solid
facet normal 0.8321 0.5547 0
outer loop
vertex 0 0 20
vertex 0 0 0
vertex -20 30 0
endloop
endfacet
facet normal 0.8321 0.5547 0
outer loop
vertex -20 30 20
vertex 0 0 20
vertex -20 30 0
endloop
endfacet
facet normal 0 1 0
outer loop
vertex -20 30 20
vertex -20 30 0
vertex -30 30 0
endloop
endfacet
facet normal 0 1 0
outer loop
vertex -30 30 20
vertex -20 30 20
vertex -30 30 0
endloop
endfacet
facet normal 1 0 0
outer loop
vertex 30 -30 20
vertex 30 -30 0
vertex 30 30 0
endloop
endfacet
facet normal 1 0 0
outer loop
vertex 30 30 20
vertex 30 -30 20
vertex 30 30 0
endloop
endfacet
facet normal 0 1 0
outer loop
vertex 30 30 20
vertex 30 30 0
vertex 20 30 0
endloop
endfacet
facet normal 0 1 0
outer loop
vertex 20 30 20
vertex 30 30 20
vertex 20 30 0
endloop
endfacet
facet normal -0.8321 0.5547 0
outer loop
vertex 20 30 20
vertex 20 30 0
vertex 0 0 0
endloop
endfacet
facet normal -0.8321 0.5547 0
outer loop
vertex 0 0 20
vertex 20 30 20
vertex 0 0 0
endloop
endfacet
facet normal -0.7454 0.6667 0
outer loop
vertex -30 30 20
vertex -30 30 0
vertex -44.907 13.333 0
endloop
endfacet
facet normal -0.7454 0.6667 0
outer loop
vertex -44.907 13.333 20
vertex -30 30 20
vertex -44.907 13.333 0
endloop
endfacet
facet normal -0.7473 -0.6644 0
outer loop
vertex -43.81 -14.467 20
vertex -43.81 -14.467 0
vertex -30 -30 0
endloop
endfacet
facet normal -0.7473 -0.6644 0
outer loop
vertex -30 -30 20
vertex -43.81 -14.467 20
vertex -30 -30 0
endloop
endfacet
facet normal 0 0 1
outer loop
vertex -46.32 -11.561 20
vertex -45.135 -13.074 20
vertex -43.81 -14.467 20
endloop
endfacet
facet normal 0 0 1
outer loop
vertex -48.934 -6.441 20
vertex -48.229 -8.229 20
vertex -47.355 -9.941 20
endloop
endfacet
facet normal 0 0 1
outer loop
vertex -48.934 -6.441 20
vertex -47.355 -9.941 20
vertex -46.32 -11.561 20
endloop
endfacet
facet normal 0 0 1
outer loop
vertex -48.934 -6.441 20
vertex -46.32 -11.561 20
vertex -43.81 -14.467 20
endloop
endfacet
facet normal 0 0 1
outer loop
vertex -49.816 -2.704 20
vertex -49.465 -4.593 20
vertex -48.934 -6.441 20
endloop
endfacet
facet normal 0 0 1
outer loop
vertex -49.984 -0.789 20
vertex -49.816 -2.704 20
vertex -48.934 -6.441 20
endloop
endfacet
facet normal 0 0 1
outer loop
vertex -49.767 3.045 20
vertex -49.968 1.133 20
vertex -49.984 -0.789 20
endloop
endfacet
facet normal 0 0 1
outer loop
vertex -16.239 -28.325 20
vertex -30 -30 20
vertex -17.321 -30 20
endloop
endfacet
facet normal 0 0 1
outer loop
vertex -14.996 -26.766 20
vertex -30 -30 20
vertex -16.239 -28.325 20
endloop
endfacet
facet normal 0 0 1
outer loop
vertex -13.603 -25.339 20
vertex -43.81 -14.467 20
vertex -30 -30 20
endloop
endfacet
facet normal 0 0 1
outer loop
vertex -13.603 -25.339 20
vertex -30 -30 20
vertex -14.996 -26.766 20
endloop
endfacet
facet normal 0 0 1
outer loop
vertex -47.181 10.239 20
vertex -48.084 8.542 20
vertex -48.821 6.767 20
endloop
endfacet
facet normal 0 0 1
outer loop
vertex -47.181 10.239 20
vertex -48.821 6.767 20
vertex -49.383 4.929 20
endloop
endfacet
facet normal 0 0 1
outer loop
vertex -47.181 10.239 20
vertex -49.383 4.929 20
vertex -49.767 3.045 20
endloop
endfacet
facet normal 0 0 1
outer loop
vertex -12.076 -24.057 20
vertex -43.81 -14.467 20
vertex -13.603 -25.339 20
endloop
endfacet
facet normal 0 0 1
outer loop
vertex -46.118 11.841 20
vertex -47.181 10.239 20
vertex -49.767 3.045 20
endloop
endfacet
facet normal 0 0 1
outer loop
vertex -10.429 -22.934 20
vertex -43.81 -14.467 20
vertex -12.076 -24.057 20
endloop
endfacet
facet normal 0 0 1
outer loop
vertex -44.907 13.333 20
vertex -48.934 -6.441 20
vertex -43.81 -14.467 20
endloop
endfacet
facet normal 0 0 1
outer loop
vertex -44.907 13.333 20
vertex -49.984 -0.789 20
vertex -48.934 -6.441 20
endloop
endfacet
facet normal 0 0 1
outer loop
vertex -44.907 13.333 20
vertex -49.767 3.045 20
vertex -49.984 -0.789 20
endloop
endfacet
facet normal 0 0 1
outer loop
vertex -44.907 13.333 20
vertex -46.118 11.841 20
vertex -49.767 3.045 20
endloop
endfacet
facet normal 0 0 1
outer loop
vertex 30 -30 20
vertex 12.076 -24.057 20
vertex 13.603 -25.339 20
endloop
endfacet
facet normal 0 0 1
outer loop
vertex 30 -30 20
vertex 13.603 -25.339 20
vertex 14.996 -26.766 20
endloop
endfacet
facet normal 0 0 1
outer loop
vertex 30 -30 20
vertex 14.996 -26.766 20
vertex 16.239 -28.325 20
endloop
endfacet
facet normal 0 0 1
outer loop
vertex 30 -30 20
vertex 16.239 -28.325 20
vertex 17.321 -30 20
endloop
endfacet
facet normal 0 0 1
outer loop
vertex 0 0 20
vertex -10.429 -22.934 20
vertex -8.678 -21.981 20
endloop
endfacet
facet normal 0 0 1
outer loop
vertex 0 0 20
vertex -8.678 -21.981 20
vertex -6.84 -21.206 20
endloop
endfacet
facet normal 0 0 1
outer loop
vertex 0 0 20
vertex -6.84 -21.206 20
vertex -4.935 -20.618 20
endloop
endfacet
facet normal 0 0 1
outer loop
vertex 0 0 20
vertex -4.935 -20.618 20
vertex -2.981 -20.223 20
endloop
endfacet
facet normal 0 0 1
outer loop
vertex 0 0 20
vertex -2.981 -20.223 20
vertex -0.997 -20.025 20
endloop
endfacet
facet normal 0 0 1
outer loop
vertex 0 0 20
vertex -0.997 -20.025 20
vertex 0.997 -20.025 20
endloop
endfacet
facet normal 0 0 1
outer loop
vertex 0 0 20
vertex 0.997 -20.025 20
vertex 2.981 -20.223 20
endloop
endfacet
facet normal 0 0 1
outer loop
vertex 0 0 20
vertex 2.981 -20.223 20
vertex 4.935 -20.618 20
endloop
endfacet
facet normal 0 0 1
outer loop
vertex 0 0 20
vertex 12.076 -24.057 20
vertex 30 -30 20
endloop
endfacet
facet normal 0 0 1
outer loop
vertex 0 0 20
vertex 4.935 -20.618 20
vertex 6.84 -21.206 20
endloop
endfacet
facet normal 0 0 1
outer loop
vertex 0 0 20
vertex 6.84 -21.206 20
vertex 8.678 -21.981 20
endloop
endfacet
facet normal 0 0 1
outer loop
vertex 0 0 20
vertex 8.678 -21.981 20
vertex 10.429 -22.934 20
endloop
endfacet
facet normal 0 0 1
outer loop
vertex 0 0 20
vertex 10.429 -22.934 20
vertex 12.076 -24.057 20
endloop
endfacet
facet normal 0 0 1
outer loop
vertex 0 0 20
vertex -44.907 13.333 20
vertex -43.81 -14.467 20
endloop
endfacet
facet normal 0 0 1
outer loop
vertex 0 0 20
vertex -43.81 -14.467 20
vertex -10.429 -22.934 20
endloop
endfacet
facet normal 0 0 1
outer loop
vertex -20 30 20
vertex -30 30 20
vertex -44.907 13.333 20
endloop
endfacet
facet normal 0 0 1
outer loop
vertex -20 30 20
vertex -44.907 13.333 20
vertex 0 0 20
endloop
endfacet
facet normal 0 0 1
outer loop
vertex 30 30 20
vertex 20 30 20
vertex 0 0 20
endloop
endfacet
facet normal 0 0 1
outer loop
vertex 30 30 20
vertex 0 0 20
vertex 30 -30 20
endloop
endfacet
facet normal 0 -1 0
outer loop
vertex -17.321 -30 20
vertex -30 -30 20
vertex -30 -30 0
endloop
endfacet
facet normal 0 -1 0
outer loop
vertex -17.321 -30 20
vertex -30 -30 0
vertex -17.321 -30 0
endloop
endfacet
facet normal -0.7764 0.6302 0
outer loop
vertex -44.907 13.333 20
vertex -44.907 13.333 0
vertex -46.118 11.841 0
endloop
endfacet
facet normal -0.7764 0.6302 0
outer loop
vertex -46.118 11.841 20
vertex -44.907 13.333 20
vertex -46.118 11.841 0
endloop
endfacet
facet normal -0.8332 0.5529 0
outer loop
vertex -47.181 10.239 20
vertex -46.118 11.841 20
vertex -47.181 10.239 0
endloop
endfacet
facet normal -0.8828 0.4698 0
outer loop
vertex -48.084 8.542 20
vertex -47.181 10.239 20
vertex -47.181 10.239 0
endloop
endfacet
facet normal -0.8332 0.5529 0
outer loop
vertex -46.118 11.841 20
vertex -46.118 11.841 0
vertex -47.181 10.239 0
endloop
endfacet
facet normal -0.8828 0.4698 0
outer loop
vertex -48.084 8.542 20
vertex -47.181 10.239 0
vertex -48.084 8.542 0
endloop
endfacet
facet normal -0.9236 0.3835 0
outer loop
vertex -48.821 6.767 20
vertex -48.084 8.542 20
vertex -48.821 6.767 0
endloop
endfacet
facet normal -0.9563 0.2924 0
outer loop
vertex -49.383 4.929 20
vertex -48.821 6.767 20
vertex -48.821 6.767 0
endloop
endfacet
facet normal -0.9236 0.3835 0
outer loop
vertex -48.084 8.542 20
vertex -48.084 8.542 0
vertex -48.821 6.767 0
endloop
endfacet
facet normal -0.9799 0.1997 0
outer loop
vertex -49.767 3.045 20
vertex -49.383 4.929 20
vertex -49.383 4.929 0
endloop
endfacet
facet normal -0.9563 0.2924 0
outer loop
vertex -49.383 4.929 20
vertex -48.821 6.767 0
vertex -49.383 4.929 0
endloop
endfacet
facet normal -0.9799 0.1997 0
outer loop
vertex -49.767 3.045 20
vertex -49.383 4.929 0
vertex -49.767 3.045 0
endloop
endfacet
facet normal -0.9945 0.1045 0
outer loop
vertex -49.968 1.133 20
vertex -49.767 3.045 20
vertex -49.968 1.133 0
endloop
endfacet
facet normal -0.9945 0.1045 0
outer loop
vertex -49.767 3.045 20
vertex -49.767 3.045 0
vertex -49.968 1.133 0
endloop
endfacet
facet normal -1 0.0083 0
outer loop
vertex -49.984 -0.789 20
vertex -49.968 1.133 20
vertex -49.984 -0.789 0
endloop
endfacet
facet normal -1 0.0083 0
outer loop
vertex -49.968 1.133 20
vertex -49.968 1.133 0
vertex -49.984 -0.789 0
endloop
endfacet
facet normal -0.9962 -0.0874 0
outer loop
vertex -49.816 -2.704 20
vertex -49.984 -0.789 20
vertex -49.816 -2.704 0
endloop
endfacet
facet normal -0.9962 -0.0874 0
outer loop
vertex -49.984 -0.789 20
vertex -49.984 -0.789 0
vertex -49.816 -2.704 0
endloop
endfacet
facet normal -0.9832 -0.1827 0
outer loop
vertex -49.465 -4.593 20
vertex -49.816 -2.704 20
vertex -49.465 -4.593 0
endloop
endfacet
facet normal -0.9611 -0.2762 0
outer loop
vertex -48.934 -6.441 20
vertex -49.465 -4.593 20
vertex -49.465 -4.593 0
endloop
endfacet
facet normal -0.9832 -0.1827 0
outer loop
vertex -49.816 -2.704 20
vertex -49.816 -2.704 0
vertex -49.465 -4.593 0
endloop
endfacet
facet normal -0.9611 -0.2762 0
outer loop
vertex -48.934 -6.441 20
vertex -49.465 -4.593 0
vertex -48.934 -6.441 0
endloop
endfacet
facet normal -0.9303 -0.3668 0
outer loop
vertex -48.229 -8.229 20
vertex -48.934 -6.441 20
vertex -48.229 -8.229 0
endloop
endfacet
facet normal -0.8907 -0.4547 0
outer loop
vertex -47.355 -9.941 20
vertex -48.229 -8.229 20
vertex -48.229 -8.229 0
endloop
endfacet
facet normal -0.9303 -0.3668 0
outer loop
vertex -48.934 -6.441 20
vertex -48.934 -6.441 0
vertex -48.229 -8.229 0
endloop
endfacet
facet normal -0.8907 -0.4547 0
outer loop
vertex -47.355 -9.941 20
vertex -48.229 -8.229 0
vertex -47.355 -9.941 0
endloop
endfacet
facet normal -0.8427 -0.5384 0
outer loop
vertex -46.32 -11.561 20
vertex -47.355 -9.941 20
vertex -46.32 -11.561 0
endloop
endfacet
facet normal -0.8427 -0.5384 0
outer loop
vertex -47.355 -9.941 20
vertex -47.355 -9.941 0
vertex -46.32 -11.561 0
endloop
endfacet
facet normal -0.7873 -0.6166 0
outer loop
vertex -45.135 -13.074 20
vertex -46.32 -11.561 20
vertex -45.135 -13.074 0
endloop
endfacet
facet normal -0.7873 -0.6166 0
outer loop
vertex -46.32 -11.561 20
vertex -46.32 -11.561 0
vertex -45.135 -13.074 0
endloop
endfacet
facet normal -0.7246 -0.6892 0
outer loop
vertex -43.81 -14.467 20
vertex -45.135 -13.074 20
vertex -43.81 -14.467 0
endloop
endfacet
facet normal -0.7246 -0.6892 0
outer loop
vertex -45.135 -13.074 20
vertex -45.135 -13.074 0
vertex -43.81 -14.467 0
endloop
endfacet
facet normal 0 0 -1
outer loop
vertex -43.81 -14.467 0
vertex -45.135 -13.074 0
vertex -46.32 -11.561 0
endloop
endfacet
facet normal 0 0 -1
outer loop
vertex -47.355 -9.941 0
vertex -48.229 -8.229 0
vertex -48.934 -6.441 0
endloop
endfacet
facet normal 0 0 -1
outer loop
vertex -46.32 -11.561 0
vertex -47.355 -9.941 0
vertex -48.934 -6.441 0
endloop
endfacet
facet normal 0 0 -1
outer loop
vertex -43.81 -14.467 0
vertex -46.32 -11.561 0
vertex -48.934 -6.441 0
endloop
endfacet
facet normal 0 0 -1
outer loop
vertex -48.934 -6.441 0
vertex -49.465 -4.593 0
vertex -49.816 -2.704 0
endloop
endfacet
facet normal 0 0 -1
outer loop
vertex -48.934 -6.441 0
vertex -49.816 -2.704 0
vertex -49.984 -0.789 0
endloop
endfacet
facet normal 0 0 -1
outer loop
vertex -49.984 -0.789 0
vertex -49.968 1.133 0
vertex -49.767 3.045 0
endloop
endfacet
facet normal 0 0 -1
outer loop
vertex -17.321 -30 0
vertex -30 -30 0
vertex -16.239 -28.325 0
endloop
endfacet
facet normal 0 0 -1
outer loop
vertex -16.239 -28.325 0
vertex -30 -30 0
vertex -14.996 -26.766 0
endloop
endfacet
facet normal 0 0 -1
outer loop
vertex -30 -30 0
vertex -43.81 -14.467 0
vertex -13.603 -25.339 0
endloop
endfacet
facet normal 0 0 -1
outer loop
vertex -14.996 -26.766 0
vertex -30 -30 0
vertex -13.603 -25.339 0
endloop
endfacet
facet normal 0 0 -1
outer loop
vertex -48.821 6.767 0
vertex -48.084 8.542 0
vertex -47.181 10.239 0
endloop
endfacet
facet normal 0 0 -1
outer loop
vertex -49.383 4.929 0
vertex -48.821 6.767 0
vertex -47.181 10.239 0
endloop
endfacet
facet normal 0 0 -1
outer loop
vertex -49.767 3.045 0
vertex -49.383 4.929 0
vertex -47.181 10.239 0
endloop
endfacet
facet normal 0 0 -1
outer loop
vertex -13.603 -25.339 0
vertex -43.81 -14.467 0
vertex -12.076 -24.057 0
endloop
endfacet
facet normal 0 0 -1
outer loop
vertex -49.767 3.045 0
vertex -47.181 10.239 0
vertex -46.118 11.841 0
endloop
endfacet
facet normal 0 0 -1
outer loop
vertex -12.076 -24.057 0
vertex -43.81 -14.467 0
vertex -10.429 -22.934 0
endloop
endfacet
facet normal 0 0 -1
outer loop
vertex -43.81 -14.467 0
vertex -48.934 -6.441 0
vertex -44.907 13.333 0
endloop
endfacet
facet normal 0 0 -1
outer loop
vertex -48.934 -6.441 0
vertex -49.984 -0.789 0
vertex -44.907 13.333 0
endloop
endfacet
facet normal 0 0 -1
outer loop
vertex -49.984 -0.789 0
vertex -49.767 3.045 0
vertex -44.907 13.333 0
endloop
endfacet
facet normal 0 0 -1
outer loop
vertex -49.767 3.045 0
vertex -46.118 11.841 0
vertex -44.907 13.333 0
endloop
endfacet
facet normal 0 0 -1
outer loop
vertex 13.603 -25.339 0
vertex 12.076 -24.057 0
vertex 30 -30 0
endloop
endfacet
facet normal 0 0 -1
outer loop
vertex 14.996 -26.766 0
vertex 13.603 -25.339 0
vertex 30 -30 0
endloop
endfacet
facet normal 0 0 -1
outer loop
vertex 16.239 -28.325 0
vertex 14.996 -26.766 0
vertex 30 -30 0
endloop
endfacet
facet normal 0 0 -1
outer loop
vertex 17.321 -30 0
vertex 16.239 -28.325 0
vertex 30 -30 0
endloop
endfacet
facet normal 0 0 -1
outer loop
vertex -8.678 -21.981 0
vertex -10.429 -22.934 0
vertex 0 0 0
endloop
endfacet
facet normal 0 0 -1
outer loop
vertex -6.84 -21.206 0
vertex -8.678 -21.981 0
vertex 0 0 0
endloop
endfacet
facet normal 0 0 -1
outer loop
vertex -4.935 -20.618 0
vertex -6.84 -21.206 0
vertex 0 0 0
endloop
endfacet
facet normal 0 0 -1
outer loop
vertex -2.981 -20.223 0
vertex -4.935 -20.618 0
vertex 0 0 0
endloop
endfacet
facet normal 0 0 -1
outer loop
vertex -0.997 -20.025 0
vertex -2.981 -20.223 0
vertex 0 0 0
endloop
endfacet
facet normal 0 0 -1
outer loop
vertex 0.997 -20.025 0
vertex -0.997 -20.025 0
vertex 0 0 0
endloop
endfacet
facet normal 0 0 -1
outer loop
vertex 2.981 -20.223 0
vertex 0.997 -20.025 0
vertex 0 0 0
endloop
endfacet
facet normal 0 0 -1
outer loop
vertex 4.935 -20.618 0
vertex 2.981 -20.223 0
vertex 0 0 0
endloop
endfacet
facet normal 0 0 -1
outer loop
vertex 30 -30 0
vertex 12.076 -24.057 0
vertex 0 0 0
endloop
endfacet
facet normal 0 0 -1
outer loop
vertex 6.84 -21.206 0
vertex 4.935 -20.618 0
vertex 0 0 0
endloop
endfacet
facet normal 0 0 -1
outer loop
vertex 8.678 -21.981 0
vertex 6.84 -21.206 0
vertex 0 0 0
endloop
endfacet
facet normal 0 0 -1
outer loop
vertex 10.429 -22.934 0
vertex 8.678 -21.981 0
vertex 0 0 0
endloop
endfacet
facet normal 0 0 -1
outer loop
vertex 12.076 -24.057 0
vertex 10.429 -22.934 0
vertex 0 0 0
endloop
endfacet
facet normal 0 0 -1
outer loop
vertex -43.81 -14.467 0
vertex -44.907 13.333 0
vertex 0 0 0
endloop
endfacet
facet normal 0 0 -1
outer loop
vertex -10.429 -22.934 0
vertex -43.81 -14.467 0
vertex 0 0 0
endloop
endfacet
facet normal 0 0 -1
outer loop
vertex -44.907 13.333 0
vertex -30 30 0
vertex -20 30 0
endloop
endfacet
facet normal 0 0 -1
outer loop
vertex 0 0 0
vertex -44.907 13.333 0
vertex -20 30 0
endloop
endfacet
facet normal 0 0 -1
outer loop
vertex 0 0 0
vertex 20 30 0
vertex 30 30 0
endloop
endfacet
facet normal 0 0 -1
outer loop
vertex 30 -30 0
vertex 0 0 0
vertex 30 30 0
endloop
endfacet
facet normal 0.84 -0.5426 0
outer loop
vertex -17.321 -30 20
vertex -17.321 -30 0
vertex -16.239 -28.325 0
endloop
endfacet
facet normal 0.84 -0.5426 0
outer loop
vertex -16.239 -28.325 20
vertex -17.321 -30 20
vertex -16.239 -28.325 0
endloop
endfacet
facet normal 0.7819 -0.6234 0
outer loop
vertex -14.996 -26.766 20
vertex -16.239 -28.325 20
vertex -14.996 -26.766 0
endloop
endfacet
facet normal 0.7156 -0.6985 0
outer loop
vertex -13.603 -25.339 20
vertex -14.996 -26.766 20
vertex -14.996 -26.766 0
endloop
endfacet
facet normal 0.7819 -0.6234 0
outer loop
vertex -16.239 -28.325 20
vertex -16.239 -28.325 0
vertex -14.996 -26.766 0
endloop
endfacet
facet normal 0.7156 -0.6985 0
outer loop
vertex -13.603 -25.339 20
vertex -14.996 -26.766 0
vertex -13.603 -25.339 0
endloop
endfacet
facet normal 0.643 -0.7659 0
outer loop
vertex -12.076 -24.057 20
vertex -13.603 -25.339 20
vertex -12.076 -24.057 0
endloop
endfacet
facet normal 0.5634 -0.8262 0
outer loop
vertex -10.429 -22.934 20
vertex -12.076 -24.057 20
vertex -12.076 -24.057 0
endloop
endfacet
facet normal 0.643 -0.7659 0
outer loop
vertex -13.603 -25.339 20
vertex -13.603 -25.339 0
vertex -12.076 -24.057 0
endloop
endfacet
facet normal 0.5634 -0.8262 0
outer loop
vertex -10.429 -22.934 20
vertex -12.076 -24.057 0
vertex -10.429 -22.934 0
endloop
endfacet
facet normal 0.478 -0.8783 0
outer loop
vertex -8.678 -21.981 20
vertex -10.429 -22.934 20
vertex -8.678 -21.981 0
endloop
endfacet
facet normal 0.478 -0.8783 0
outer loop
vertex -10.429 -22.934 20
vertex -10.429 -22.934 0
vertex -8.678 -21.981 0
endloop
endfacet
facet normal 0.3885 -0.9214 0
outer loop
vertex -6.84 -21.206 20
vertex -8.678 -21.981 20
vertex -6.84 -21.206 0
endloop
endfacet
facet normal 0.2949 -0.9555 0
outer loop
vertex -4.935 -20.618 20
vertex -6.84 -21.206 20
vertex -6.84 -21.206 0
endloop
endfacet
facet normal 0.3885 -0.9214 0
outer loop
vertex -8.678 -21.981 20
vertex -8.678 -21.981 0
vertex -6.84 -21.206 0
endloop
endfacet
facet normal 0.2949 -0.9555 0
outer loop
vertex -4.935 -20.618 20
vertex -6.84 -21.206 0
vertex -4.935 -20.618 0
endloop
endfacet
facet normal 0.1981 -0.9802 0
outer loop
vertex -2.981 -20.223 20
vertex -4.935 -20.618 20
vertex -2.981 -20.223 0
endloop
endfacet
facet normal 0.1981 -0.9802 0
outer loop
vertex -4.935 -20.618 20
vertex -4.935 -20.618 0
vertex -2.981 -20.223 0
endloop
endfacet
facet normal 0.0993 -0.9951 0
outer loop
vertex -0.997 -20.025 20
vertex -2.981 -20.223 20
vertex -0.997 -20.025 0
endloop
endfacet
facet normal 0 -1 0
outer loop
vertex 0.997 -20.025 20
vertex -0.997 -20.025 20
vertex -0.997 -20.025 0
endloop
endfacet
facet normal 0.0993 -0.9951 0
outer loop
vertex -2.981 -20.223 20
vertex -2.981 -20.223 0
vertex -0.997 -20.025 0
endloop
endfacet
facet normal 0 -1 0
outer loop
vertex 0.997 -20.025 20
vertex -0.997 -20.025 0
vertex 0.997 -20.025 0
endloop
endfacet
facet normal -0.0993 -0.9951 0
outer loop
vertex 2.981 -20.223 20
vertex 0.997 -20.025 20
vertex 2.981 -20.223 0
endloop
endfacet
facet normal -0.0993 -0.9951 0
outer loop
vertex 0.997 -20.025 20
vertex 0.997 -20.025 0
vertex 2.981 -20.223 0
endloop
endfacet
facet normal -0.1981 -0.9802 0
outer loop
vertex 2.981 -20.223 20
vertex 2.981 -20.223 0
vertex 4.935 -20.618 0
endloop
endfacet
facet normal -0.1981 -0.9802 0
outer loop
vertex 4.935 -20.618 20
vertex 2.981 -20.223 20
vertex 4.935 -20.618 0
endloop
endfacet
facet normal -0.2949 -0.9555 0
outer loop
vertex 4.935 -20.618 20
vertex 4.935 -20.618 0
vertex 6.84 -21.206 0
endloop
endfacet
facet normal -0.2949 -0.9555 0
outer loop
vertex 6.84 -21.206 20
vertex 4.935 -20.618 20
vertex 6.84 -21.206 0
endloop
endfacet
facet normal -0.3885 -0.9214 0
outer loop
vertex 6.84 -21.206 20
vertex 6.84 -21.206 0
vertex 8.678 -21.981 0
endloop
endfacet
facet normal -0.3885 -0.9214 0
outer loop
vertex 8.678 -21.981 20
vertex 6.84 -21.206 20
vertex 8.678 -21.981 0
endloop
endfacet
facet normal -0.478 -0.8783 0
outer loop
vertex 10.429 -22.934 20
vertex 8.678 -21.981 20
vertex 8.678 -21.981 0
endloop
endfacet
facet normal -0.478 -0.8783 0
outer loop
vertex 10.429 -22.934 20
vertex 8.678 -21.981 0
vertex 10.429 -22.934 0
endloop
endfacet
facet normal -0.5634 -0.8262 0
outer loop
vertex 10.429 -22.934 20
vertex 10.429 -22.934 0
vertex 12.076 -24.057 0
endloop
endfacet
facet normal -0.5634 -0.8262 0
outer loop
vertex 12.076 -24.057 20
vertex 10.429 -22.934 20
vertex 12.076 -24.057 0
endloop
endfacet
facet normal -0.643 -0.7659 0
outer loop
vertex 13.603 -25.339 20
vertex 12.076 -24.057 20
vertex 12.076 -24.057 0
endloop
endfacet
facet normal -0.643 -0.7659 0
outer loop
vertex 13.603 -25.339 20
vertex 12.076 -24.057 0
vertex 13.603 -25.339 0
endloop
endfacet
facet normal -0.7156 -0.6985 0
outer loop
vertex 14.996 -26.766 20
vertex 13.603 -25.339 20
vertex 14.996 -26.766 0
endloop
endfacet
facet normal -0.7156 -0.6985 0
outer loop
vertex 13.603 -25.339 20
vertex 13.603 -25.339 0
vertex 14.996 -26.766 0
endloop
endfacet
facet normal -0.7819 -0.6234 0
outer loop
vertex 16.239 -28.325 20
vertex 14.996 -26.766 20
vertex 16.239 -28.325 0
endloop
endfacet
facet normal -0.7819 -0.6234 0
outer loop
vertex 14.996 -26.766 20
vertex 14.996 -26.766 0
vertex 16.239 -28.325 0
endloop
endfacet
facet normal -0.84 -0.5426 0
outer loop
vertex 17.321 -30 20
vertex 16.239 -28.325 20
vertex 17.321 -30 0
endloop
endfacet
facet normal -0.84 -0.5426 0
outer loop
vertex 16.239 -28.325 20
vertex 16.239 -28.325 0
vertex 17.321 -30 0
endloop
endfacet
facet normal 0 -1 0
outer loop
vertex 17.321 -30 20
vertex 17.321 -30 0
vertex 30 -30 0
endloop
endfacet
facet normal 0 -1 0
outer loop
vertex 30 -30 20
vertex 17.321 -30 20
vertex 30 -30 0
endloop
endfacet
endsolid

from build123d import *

# Parameters (mm, degrees)
F1_DEPTH = 20


with BuildPart() as f1:
    # F0 (on Top) → F1 (new body)
    with BuildSketch(Plane.XY):
        with BuildLine():
            ThreePointArc((-44.90712, 13.333333), (-22.863558, 18.683447), (-10, 0))
            ThreePointArc((-10, 0), (-22.132295, -18.387475), (-43.809922, -14.466722))
            Line((-43.809922, -14.466722), (-30, -30))
            Line((-30, -30), (-17.320508, -30))
            ThreePointArc((-17.320508, -30), (0, -20), (17.320508, -30))
            Line((17.320508, -30), (30, -30))
            Line((30, -30), (30, 30))
            Line((30, 30), (20, 30))
            Line((20, 30), (0, 0))
            Line((0, 0), (-20, 30))
            Line((-20, 30), (-30, 30))
            Line((-30, 30), (-44.90712, 13.333333))
        make_face()
        with BuildLine():
            ThreePointArc((-43.809922, -14.466722), (-22.132295, -18.387475), (-10, 0))
            ThreePointArc((-10, 0), (-22.863558, 18.683447), (-44.90712, 13.333333))
            ThreePointArc((-44.90712, 13.333333), (-49.984441, -0.788735), (-43.809922, -14.466722))
        make_face()
    extrude(amount=F1_DEPTH)


solid = f1.part
